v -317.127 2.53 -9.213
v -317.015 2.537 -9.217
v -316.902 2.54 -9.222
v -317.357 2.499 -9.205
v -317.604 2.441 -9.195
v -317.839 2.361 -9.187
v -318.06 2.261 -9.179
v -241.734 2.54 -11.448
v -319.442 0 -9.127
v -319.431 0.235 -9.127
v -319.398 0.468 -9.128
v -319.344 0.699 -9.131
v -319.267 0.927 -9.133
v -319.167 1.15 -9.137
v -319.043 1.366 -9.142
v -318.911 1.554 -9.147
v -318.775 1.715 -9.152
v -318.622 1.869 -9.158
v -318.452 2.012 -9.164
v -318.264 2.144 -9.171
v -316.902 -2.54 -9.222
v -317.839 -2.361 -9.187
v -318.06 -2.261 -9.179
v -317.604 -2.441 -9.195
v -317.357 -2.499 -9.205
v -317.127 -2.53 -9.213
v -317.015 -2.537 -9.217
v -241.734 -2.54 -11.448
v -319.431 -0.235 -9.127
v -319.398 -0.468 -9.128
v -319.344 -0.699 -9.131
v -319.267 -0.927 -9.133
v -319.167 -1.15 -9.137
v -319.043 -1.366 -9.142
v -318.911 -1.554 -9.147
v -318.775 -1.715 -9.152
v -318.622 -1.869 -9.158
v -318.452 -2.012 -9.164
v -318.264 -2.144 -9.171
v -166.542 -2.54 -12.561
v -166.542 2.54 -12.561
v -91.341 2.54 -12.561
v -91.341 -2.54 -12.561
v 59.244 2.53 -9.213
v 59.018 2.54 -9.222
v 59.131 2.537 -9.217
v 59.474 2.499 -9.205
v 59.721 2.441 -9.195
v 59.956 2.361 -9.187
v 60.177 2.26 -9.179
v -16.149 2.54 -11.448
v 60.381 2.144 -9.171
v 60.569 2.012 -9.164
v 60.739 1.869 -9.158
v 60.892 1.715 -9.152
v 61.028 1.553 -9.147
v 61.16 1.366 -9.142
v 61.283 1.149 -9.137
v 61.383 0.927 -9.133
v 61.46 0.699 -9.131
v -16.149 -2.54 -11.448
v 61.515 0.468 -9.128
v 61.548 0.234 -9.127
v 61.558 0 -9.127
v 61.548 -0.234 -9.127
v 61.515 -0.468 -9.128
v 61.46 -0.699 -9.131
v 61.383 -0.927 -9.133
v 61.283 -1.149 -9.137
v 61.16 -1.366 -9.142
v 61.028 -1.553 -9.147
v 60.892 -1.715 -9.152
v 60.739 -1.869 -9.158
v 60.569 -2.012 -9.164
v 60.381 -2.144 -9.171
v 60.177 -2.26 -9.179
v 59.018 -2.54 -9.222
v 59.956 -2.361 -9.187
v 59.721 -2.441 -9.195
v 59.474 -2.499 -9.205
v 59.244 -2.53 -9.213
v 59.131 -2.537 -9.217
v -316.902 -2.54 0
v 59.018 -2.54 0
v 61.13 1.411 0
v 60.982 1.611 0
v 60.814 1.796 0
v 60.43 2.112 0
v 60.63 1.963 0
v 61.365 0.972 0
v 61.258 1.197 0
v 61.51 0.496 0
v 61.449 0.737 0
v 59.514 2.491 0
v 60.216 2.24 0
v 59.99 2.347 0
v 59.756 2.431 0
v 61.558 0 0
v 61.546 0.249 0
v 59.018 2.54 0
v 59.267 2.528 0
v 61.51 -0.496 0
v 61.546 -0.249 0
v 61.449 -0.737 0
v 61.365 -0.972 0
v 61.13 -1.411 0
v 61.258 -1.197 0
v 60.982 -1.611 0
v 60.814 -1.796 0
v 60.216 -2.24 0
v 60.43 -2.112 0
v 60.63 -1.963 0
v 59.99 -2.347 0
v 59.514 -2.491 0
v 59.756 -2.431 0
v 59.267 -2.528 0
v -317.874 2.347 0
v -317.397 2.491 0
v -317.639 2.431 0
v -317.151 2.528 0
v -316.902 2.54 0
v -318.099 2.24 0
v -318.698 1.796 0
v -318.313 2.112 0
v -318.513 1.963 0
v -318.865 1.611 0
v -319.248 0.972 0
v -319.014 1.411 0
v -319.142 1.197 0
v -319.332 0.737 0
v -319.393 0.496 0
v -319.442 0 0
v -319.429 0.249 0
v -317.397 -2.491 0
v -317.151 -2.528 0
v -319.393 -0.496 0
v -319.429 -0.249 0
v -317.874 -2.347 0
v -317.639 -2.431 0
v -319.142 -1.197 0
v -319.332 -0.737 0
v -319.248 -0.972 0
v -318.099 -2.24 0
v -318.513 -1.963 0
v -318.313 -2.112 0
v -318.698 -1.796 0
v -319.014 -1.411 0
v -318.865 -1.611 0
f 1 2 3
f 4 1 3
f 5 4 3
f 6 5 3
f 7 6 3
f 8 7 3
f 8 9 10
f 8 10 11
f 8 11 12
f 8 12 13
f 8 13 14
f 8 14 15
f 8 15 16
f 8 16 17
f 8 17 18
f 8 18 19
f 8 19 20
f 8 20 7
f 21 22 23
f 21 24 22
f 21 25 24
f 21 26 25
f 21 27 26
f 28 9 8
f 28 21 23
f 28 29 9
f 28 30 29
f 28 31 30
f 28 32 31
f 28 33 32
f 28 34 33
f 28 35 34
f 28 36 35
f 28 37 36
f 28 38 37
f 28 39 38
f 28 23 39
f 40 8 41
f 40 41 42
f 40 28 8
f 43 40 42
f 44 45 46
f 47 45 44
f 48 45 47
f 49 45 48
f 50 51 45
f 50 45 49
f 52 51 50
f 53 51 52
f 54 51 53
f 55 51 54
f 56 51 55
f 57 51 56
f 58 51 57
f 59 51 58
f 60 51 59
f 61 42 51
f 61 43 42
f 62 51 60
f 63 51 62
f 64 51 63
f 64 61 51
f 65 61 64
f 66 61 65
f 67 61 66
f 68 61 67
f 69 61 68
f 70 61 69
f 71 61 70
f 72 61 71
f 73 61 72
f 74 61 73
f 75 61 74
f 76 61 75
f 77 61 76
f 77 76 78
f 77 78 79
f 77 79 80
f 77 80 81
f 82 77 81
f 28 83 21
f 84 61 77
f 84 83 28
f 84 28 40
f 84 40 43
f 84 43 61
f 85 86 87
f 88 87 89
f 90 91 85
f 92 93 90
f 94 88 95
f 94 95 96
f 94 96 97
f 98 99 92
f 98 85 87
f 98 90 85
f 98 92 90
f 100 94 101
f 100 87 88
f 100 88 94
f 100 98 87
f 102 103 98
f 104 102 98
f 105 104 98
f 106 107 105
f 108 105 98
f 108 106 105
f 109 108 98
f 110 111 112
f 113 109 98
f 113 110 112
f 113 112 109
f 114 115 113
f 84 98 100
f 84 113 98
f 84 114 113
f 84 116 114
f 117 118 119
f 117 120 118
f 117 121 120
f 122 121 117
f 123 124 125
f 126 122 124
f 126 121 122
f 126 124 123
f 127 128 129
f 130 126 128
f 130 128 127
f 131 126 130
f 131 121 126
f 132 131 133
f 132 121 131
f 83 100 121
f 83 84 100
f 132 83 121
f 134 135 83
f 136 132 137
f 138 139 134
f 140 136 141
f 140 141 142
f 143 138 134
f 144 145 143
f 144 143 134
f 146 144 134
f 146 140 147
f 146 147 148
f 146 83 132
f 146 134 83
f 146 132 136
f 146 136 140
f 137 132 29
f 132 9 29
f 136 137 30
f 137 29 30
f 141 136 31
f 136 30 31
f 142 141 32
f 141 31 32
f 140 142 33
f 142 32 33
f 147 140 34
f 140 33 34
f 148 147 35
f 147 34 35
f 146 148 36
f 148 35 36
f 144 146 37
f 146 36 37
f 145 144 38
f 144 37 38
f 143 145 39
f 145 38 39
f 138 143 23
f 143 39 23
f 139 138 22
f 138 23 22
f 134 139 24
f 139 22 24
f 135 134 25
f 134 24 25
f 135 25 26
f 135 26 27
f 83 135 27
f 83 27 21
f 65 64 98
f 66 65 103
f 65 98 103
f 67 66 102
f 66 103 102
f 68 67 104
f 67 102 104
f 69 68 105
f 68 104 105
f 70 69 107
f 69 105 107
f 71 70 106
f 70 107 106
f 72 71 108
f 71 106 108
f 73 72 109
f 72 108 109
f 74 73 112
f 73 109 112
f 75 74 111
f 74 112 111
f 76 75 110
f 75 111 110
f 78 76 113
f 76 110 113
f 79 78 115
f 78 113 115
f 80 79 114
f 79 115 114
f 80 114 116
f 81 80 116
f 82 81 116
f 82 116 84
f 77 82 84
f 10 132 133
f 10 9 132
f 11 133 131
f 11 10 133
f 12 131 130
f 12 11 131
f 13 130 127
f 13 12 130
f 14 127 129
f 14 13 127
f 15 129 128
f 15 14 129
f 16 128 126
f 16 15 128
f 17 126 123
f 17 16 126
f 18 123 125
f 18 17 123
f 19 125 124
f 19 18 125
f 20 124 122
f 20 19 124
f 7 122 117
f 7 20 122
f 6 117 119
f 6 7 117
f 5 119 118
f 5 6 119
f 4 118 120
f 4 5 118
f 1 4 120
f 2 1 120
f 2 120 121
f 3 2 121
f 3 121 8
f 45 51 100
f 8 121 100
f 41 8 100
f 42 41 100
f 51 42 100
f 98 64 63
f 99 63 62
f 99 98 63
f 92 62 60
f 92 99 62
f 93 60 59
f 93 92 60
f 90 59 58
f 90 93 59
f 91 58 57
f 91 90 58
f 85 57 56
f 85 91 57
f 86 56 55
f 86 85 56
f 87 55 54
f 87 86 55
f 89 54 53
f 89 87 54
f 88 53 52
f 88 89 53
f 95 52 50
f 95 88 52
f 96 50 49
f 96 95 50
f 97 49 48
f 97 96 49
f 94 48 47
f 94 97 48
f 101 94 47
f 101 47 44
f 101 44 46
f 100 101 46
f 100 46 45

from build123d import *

# Parameters (mm, degrees)
F1_DEPTH = 2.54
F2_R     = 2.53999


# Not quite as in the source:
# - a fillet or chamfer is up to 0.001 mm smaller than in the source, because OpenCascade refuses the exact size


with BuildPart() as f1:
    # F0 (on Front) → F1 (new body, symmetric)
    with BuildSketch(Plane.XZ):
        with BuildLine():
            Line((-128.9416431369, 0), (-319.4416431369, 0))
            Line((-319.4416431369, 0), (-319.4416431369, -9.126868379))
            ThreePointArc((-319.4416431369, -9.126868379), (-224.2083966105, -11.8066385421), (-128.9416431369, -12.7))
            Line((-128.9416431369, -12.7), (-128.9416431369, 0))
        make_face()
        with BuildLine():
            Line((61.5583568631, 0), (-128.9416431369, 0))
            Line((-128.9416431369, 0), (-128.9416431369, -12.7))
            ThreePointArc((-128.9416431369, -12.7), (-33.6748896633, -11.8066385421), (61.5583568631, -9.126868379))
            Line((61.5583568631, -9.126868379), (61.5583568631, 0))
        make_face()
    extrude(amount=F1_DEPTH, both=True)

    # F2 (radius 2.54 in the source; OpenCascade refuses exactly that, so slightly less here)
    f2_edges = [f1.edges().sort_by_distance(p)[0] for p in [
        (-319.441643, -2.54, -4.563434),
        (-319.441643, 2.54, -4.563434),
        (61.558357, -2.54, -4.563434),
        (61.558357, 2.54, -4.563434),
    ]]
    fillet(f2_edges, radius=F2_R)


solid = f1.part
